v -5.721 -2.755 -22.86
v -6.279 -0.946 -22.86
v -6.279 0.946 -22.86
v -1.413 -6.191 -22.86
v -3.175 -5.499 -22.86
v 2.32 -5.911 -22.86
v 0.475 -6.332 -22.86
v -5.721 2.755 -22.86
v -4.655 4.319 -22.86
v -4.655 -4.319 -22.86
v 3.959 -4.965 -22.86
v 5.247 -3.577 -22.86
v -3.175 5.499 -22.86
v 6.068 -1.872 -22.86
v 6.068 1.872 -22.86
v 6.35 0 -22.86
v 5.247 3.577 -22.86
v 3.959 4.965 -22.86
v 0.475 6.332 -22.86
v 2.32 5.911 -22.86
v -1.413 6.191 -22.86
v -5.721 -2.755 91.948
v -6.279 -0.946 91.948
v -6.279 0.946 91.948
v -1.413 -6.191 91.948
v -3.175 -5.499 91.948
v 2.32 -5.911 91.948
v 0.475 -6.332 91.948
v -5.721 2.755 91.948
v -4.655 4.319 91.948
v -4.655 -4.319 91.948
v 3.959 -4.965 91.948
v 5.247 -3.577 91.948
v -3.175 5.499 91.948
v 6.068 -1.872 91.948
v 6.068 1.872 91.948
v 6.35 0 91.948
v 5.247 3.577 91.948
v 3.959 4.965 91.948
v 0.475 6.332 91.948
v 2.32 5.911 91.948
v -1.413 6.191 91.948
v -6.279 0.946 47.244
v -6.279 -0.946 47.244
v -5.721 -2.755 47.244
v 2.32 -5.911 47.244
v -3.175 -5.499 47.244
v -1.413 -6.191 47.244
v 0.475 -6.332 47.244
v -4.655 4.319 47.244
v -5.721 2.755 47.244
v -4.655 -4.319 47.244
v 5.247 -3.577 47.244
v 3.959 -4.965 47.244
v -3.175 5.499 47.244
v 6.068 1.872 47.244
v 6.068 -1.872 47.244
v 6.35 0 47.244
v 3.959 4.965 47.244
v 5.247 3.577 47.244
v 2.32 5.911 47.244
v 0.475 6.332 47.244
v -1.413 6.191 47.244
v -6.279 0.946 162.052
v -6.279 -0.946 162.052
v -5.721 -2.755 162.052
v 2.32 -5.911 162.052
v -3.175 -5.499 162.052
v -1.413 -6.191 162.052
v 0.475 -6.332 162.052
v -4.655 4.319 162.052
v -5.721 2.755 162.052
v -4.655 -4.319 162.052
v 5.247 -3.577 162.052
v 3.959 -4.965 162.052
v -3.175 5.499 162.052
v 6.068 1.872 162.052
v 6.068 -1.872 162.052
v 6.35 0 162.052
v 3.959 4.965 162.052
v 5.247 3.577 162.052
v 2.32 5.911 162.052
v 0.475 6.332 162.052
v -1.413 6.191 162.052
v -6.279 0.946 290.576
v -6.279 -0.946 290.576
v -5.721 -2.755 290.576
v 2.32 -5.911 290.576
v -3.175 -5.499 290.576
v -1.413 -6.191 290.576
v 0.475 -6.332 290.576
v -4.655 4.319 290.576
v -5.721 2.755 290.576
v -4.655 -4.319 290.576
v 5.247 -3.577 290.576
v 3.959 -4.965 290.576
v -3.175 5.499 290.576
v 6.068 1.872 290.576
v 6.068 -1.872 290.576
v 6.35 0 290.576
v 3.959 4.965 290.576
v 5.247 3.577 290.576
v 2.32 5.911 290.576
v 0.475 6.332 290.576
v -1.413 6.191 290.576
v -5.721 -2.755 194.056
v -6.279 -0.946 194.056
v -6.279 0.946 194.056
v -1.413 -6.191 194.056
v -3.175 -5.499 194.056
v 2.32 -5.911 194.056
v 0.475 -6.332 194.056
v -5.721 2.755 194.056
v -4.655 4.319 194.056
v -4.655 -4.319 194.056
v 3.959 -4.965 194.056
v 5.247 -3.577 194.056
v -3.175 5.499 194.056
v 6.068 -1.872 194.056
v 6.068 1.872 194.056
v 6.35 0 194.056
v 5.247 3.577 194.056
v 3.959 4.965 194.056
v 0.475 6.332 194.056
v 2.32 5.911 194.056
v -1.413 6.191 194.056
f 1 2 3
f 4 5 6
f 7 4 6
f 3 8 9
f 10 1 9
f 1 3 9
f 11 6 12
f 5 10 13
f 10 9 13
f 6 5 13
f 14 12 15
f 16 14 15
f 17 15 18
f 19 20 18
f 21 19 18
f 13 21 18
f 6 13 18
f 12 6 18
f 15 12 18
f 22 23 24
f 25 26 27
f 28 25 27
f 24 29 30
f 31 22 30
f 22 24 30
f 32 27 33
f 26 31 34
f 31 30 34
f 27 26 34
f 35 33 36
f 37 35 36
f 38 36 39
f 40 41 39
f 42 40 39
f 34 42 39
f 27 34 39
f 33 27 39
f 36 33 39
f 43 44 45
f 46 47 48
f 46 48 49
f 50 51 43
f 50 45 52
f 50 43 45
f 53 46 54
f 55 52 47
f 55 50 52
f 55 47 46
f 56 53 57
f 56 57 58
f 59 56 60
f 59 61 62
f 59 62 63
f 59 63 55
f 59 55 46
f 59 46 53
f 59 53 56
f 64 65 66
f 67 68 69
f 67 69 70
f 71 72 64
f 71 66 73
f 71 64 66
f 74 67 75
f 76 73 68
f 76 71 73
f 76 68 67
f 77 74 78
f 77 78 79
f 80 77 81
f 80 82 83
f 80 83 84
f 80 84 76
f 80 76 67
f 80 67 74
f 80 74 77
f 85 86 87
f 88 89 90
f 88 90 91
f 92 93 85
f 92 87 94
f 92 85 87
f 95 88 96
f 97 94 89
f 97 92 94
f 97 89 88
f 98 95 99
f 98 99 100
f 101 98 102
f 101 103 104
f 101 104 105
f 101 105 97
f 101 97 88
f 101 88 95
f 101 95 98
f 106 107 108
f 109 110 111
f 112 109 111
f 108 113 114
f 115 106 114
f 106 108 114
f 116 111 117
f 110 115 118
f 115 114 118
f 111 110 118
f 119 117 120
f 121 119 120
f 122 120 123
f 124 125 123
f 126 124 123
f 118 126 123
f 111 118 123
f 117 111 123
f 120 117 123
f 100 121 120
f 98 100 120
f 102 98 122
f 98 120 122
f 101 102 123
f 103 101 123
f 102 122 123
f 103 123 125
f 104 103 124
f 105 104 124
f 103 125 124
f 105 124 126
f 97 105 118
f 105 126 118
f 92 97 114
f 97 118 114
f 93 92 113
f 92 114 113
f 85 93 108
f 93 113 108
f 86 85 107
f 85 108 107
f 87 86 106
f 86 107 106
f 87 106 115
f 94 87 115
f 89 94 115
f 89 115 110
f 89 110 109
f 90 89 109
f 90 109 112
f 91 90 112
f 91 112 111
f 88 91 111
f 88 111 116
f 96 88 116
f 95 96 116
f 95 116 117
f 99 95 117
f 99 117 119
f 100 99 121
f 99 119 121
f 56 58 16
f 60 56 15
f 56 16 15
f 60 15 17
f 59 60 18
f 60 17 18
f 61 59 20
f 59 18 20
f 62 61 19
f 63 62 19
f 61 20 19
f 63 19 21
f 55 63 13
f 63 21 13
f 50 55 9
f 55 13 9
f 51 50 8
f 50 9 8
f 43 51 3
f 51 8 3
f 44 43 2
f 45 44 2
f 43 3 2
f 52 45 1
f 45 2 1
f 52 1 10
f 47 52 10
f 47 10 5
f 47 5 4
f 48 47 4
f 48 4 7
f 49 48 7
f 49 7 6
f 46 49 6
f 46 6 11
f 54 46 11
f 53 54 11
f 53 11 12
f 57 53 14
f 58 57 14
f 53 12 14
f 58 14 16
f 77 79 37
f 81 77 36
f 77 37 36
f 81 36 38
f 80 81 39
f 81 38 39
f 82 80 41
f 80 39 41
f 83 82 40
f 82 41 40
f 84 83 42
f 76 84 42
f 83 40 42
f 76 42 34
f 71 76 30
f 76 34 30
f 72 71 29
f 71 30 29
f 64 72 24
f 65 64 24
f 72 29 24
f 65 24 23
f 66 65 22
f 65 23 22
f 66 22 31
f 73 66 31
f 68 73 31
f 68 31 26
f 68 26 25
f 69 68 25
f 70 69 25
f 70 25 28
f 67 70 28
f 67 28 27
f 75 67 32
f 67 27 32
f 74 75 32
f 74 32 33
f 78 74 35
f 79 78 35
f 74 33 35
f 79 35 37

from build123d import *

# Parameters (mm, degrees)
BOSS_EXTRUDE1_OUTLINE_R = 6.35
BOSS_EXTRUDE1_DEPTH     = 70.104
SKETCH3_R               = 6.35
BOSS_EXTRUDE2_DEPTH     = 70.104
SKETCH4_R               = 6.35
BOSS_EXTRUDE3_DEPTH     = 96.52


# Read off the part's stored shape, not the designer's step: Boss-Extrude1
with BuildPart() as part:
    # Boss-Extrude1 outline → Boss-Extrude1 (new body)
    with BuildSketch(Plane.XY.offset(-22.86)):
        Circle(BOSS_EXTRUDE1_OUTLINE_R)
    extrude(amount=BOSS_EXTRUDE1_DEPTH)


with BuildPart() as body_2:
    # Sketch3 → Boss-Extrude2 (new body)
    with BuildSketch(Plane.XY.offset(91.948)):
        Circle(SKETCH3_R)
    extrude(amount=BOSS_EXTRUDE2_DEPTH)


with BuildPart() as body_3:
    # Sketch4 → Boss-Extrude3 (new body)
    with BuildSketch(Plane.XY.offset(194.056)):
        Circle(SKETCH4_R)
    extrude(amount=BOSS_EXTRUDE3_DEPTH)


solid = Compound([part.part, body_2.part, body_3.part])
